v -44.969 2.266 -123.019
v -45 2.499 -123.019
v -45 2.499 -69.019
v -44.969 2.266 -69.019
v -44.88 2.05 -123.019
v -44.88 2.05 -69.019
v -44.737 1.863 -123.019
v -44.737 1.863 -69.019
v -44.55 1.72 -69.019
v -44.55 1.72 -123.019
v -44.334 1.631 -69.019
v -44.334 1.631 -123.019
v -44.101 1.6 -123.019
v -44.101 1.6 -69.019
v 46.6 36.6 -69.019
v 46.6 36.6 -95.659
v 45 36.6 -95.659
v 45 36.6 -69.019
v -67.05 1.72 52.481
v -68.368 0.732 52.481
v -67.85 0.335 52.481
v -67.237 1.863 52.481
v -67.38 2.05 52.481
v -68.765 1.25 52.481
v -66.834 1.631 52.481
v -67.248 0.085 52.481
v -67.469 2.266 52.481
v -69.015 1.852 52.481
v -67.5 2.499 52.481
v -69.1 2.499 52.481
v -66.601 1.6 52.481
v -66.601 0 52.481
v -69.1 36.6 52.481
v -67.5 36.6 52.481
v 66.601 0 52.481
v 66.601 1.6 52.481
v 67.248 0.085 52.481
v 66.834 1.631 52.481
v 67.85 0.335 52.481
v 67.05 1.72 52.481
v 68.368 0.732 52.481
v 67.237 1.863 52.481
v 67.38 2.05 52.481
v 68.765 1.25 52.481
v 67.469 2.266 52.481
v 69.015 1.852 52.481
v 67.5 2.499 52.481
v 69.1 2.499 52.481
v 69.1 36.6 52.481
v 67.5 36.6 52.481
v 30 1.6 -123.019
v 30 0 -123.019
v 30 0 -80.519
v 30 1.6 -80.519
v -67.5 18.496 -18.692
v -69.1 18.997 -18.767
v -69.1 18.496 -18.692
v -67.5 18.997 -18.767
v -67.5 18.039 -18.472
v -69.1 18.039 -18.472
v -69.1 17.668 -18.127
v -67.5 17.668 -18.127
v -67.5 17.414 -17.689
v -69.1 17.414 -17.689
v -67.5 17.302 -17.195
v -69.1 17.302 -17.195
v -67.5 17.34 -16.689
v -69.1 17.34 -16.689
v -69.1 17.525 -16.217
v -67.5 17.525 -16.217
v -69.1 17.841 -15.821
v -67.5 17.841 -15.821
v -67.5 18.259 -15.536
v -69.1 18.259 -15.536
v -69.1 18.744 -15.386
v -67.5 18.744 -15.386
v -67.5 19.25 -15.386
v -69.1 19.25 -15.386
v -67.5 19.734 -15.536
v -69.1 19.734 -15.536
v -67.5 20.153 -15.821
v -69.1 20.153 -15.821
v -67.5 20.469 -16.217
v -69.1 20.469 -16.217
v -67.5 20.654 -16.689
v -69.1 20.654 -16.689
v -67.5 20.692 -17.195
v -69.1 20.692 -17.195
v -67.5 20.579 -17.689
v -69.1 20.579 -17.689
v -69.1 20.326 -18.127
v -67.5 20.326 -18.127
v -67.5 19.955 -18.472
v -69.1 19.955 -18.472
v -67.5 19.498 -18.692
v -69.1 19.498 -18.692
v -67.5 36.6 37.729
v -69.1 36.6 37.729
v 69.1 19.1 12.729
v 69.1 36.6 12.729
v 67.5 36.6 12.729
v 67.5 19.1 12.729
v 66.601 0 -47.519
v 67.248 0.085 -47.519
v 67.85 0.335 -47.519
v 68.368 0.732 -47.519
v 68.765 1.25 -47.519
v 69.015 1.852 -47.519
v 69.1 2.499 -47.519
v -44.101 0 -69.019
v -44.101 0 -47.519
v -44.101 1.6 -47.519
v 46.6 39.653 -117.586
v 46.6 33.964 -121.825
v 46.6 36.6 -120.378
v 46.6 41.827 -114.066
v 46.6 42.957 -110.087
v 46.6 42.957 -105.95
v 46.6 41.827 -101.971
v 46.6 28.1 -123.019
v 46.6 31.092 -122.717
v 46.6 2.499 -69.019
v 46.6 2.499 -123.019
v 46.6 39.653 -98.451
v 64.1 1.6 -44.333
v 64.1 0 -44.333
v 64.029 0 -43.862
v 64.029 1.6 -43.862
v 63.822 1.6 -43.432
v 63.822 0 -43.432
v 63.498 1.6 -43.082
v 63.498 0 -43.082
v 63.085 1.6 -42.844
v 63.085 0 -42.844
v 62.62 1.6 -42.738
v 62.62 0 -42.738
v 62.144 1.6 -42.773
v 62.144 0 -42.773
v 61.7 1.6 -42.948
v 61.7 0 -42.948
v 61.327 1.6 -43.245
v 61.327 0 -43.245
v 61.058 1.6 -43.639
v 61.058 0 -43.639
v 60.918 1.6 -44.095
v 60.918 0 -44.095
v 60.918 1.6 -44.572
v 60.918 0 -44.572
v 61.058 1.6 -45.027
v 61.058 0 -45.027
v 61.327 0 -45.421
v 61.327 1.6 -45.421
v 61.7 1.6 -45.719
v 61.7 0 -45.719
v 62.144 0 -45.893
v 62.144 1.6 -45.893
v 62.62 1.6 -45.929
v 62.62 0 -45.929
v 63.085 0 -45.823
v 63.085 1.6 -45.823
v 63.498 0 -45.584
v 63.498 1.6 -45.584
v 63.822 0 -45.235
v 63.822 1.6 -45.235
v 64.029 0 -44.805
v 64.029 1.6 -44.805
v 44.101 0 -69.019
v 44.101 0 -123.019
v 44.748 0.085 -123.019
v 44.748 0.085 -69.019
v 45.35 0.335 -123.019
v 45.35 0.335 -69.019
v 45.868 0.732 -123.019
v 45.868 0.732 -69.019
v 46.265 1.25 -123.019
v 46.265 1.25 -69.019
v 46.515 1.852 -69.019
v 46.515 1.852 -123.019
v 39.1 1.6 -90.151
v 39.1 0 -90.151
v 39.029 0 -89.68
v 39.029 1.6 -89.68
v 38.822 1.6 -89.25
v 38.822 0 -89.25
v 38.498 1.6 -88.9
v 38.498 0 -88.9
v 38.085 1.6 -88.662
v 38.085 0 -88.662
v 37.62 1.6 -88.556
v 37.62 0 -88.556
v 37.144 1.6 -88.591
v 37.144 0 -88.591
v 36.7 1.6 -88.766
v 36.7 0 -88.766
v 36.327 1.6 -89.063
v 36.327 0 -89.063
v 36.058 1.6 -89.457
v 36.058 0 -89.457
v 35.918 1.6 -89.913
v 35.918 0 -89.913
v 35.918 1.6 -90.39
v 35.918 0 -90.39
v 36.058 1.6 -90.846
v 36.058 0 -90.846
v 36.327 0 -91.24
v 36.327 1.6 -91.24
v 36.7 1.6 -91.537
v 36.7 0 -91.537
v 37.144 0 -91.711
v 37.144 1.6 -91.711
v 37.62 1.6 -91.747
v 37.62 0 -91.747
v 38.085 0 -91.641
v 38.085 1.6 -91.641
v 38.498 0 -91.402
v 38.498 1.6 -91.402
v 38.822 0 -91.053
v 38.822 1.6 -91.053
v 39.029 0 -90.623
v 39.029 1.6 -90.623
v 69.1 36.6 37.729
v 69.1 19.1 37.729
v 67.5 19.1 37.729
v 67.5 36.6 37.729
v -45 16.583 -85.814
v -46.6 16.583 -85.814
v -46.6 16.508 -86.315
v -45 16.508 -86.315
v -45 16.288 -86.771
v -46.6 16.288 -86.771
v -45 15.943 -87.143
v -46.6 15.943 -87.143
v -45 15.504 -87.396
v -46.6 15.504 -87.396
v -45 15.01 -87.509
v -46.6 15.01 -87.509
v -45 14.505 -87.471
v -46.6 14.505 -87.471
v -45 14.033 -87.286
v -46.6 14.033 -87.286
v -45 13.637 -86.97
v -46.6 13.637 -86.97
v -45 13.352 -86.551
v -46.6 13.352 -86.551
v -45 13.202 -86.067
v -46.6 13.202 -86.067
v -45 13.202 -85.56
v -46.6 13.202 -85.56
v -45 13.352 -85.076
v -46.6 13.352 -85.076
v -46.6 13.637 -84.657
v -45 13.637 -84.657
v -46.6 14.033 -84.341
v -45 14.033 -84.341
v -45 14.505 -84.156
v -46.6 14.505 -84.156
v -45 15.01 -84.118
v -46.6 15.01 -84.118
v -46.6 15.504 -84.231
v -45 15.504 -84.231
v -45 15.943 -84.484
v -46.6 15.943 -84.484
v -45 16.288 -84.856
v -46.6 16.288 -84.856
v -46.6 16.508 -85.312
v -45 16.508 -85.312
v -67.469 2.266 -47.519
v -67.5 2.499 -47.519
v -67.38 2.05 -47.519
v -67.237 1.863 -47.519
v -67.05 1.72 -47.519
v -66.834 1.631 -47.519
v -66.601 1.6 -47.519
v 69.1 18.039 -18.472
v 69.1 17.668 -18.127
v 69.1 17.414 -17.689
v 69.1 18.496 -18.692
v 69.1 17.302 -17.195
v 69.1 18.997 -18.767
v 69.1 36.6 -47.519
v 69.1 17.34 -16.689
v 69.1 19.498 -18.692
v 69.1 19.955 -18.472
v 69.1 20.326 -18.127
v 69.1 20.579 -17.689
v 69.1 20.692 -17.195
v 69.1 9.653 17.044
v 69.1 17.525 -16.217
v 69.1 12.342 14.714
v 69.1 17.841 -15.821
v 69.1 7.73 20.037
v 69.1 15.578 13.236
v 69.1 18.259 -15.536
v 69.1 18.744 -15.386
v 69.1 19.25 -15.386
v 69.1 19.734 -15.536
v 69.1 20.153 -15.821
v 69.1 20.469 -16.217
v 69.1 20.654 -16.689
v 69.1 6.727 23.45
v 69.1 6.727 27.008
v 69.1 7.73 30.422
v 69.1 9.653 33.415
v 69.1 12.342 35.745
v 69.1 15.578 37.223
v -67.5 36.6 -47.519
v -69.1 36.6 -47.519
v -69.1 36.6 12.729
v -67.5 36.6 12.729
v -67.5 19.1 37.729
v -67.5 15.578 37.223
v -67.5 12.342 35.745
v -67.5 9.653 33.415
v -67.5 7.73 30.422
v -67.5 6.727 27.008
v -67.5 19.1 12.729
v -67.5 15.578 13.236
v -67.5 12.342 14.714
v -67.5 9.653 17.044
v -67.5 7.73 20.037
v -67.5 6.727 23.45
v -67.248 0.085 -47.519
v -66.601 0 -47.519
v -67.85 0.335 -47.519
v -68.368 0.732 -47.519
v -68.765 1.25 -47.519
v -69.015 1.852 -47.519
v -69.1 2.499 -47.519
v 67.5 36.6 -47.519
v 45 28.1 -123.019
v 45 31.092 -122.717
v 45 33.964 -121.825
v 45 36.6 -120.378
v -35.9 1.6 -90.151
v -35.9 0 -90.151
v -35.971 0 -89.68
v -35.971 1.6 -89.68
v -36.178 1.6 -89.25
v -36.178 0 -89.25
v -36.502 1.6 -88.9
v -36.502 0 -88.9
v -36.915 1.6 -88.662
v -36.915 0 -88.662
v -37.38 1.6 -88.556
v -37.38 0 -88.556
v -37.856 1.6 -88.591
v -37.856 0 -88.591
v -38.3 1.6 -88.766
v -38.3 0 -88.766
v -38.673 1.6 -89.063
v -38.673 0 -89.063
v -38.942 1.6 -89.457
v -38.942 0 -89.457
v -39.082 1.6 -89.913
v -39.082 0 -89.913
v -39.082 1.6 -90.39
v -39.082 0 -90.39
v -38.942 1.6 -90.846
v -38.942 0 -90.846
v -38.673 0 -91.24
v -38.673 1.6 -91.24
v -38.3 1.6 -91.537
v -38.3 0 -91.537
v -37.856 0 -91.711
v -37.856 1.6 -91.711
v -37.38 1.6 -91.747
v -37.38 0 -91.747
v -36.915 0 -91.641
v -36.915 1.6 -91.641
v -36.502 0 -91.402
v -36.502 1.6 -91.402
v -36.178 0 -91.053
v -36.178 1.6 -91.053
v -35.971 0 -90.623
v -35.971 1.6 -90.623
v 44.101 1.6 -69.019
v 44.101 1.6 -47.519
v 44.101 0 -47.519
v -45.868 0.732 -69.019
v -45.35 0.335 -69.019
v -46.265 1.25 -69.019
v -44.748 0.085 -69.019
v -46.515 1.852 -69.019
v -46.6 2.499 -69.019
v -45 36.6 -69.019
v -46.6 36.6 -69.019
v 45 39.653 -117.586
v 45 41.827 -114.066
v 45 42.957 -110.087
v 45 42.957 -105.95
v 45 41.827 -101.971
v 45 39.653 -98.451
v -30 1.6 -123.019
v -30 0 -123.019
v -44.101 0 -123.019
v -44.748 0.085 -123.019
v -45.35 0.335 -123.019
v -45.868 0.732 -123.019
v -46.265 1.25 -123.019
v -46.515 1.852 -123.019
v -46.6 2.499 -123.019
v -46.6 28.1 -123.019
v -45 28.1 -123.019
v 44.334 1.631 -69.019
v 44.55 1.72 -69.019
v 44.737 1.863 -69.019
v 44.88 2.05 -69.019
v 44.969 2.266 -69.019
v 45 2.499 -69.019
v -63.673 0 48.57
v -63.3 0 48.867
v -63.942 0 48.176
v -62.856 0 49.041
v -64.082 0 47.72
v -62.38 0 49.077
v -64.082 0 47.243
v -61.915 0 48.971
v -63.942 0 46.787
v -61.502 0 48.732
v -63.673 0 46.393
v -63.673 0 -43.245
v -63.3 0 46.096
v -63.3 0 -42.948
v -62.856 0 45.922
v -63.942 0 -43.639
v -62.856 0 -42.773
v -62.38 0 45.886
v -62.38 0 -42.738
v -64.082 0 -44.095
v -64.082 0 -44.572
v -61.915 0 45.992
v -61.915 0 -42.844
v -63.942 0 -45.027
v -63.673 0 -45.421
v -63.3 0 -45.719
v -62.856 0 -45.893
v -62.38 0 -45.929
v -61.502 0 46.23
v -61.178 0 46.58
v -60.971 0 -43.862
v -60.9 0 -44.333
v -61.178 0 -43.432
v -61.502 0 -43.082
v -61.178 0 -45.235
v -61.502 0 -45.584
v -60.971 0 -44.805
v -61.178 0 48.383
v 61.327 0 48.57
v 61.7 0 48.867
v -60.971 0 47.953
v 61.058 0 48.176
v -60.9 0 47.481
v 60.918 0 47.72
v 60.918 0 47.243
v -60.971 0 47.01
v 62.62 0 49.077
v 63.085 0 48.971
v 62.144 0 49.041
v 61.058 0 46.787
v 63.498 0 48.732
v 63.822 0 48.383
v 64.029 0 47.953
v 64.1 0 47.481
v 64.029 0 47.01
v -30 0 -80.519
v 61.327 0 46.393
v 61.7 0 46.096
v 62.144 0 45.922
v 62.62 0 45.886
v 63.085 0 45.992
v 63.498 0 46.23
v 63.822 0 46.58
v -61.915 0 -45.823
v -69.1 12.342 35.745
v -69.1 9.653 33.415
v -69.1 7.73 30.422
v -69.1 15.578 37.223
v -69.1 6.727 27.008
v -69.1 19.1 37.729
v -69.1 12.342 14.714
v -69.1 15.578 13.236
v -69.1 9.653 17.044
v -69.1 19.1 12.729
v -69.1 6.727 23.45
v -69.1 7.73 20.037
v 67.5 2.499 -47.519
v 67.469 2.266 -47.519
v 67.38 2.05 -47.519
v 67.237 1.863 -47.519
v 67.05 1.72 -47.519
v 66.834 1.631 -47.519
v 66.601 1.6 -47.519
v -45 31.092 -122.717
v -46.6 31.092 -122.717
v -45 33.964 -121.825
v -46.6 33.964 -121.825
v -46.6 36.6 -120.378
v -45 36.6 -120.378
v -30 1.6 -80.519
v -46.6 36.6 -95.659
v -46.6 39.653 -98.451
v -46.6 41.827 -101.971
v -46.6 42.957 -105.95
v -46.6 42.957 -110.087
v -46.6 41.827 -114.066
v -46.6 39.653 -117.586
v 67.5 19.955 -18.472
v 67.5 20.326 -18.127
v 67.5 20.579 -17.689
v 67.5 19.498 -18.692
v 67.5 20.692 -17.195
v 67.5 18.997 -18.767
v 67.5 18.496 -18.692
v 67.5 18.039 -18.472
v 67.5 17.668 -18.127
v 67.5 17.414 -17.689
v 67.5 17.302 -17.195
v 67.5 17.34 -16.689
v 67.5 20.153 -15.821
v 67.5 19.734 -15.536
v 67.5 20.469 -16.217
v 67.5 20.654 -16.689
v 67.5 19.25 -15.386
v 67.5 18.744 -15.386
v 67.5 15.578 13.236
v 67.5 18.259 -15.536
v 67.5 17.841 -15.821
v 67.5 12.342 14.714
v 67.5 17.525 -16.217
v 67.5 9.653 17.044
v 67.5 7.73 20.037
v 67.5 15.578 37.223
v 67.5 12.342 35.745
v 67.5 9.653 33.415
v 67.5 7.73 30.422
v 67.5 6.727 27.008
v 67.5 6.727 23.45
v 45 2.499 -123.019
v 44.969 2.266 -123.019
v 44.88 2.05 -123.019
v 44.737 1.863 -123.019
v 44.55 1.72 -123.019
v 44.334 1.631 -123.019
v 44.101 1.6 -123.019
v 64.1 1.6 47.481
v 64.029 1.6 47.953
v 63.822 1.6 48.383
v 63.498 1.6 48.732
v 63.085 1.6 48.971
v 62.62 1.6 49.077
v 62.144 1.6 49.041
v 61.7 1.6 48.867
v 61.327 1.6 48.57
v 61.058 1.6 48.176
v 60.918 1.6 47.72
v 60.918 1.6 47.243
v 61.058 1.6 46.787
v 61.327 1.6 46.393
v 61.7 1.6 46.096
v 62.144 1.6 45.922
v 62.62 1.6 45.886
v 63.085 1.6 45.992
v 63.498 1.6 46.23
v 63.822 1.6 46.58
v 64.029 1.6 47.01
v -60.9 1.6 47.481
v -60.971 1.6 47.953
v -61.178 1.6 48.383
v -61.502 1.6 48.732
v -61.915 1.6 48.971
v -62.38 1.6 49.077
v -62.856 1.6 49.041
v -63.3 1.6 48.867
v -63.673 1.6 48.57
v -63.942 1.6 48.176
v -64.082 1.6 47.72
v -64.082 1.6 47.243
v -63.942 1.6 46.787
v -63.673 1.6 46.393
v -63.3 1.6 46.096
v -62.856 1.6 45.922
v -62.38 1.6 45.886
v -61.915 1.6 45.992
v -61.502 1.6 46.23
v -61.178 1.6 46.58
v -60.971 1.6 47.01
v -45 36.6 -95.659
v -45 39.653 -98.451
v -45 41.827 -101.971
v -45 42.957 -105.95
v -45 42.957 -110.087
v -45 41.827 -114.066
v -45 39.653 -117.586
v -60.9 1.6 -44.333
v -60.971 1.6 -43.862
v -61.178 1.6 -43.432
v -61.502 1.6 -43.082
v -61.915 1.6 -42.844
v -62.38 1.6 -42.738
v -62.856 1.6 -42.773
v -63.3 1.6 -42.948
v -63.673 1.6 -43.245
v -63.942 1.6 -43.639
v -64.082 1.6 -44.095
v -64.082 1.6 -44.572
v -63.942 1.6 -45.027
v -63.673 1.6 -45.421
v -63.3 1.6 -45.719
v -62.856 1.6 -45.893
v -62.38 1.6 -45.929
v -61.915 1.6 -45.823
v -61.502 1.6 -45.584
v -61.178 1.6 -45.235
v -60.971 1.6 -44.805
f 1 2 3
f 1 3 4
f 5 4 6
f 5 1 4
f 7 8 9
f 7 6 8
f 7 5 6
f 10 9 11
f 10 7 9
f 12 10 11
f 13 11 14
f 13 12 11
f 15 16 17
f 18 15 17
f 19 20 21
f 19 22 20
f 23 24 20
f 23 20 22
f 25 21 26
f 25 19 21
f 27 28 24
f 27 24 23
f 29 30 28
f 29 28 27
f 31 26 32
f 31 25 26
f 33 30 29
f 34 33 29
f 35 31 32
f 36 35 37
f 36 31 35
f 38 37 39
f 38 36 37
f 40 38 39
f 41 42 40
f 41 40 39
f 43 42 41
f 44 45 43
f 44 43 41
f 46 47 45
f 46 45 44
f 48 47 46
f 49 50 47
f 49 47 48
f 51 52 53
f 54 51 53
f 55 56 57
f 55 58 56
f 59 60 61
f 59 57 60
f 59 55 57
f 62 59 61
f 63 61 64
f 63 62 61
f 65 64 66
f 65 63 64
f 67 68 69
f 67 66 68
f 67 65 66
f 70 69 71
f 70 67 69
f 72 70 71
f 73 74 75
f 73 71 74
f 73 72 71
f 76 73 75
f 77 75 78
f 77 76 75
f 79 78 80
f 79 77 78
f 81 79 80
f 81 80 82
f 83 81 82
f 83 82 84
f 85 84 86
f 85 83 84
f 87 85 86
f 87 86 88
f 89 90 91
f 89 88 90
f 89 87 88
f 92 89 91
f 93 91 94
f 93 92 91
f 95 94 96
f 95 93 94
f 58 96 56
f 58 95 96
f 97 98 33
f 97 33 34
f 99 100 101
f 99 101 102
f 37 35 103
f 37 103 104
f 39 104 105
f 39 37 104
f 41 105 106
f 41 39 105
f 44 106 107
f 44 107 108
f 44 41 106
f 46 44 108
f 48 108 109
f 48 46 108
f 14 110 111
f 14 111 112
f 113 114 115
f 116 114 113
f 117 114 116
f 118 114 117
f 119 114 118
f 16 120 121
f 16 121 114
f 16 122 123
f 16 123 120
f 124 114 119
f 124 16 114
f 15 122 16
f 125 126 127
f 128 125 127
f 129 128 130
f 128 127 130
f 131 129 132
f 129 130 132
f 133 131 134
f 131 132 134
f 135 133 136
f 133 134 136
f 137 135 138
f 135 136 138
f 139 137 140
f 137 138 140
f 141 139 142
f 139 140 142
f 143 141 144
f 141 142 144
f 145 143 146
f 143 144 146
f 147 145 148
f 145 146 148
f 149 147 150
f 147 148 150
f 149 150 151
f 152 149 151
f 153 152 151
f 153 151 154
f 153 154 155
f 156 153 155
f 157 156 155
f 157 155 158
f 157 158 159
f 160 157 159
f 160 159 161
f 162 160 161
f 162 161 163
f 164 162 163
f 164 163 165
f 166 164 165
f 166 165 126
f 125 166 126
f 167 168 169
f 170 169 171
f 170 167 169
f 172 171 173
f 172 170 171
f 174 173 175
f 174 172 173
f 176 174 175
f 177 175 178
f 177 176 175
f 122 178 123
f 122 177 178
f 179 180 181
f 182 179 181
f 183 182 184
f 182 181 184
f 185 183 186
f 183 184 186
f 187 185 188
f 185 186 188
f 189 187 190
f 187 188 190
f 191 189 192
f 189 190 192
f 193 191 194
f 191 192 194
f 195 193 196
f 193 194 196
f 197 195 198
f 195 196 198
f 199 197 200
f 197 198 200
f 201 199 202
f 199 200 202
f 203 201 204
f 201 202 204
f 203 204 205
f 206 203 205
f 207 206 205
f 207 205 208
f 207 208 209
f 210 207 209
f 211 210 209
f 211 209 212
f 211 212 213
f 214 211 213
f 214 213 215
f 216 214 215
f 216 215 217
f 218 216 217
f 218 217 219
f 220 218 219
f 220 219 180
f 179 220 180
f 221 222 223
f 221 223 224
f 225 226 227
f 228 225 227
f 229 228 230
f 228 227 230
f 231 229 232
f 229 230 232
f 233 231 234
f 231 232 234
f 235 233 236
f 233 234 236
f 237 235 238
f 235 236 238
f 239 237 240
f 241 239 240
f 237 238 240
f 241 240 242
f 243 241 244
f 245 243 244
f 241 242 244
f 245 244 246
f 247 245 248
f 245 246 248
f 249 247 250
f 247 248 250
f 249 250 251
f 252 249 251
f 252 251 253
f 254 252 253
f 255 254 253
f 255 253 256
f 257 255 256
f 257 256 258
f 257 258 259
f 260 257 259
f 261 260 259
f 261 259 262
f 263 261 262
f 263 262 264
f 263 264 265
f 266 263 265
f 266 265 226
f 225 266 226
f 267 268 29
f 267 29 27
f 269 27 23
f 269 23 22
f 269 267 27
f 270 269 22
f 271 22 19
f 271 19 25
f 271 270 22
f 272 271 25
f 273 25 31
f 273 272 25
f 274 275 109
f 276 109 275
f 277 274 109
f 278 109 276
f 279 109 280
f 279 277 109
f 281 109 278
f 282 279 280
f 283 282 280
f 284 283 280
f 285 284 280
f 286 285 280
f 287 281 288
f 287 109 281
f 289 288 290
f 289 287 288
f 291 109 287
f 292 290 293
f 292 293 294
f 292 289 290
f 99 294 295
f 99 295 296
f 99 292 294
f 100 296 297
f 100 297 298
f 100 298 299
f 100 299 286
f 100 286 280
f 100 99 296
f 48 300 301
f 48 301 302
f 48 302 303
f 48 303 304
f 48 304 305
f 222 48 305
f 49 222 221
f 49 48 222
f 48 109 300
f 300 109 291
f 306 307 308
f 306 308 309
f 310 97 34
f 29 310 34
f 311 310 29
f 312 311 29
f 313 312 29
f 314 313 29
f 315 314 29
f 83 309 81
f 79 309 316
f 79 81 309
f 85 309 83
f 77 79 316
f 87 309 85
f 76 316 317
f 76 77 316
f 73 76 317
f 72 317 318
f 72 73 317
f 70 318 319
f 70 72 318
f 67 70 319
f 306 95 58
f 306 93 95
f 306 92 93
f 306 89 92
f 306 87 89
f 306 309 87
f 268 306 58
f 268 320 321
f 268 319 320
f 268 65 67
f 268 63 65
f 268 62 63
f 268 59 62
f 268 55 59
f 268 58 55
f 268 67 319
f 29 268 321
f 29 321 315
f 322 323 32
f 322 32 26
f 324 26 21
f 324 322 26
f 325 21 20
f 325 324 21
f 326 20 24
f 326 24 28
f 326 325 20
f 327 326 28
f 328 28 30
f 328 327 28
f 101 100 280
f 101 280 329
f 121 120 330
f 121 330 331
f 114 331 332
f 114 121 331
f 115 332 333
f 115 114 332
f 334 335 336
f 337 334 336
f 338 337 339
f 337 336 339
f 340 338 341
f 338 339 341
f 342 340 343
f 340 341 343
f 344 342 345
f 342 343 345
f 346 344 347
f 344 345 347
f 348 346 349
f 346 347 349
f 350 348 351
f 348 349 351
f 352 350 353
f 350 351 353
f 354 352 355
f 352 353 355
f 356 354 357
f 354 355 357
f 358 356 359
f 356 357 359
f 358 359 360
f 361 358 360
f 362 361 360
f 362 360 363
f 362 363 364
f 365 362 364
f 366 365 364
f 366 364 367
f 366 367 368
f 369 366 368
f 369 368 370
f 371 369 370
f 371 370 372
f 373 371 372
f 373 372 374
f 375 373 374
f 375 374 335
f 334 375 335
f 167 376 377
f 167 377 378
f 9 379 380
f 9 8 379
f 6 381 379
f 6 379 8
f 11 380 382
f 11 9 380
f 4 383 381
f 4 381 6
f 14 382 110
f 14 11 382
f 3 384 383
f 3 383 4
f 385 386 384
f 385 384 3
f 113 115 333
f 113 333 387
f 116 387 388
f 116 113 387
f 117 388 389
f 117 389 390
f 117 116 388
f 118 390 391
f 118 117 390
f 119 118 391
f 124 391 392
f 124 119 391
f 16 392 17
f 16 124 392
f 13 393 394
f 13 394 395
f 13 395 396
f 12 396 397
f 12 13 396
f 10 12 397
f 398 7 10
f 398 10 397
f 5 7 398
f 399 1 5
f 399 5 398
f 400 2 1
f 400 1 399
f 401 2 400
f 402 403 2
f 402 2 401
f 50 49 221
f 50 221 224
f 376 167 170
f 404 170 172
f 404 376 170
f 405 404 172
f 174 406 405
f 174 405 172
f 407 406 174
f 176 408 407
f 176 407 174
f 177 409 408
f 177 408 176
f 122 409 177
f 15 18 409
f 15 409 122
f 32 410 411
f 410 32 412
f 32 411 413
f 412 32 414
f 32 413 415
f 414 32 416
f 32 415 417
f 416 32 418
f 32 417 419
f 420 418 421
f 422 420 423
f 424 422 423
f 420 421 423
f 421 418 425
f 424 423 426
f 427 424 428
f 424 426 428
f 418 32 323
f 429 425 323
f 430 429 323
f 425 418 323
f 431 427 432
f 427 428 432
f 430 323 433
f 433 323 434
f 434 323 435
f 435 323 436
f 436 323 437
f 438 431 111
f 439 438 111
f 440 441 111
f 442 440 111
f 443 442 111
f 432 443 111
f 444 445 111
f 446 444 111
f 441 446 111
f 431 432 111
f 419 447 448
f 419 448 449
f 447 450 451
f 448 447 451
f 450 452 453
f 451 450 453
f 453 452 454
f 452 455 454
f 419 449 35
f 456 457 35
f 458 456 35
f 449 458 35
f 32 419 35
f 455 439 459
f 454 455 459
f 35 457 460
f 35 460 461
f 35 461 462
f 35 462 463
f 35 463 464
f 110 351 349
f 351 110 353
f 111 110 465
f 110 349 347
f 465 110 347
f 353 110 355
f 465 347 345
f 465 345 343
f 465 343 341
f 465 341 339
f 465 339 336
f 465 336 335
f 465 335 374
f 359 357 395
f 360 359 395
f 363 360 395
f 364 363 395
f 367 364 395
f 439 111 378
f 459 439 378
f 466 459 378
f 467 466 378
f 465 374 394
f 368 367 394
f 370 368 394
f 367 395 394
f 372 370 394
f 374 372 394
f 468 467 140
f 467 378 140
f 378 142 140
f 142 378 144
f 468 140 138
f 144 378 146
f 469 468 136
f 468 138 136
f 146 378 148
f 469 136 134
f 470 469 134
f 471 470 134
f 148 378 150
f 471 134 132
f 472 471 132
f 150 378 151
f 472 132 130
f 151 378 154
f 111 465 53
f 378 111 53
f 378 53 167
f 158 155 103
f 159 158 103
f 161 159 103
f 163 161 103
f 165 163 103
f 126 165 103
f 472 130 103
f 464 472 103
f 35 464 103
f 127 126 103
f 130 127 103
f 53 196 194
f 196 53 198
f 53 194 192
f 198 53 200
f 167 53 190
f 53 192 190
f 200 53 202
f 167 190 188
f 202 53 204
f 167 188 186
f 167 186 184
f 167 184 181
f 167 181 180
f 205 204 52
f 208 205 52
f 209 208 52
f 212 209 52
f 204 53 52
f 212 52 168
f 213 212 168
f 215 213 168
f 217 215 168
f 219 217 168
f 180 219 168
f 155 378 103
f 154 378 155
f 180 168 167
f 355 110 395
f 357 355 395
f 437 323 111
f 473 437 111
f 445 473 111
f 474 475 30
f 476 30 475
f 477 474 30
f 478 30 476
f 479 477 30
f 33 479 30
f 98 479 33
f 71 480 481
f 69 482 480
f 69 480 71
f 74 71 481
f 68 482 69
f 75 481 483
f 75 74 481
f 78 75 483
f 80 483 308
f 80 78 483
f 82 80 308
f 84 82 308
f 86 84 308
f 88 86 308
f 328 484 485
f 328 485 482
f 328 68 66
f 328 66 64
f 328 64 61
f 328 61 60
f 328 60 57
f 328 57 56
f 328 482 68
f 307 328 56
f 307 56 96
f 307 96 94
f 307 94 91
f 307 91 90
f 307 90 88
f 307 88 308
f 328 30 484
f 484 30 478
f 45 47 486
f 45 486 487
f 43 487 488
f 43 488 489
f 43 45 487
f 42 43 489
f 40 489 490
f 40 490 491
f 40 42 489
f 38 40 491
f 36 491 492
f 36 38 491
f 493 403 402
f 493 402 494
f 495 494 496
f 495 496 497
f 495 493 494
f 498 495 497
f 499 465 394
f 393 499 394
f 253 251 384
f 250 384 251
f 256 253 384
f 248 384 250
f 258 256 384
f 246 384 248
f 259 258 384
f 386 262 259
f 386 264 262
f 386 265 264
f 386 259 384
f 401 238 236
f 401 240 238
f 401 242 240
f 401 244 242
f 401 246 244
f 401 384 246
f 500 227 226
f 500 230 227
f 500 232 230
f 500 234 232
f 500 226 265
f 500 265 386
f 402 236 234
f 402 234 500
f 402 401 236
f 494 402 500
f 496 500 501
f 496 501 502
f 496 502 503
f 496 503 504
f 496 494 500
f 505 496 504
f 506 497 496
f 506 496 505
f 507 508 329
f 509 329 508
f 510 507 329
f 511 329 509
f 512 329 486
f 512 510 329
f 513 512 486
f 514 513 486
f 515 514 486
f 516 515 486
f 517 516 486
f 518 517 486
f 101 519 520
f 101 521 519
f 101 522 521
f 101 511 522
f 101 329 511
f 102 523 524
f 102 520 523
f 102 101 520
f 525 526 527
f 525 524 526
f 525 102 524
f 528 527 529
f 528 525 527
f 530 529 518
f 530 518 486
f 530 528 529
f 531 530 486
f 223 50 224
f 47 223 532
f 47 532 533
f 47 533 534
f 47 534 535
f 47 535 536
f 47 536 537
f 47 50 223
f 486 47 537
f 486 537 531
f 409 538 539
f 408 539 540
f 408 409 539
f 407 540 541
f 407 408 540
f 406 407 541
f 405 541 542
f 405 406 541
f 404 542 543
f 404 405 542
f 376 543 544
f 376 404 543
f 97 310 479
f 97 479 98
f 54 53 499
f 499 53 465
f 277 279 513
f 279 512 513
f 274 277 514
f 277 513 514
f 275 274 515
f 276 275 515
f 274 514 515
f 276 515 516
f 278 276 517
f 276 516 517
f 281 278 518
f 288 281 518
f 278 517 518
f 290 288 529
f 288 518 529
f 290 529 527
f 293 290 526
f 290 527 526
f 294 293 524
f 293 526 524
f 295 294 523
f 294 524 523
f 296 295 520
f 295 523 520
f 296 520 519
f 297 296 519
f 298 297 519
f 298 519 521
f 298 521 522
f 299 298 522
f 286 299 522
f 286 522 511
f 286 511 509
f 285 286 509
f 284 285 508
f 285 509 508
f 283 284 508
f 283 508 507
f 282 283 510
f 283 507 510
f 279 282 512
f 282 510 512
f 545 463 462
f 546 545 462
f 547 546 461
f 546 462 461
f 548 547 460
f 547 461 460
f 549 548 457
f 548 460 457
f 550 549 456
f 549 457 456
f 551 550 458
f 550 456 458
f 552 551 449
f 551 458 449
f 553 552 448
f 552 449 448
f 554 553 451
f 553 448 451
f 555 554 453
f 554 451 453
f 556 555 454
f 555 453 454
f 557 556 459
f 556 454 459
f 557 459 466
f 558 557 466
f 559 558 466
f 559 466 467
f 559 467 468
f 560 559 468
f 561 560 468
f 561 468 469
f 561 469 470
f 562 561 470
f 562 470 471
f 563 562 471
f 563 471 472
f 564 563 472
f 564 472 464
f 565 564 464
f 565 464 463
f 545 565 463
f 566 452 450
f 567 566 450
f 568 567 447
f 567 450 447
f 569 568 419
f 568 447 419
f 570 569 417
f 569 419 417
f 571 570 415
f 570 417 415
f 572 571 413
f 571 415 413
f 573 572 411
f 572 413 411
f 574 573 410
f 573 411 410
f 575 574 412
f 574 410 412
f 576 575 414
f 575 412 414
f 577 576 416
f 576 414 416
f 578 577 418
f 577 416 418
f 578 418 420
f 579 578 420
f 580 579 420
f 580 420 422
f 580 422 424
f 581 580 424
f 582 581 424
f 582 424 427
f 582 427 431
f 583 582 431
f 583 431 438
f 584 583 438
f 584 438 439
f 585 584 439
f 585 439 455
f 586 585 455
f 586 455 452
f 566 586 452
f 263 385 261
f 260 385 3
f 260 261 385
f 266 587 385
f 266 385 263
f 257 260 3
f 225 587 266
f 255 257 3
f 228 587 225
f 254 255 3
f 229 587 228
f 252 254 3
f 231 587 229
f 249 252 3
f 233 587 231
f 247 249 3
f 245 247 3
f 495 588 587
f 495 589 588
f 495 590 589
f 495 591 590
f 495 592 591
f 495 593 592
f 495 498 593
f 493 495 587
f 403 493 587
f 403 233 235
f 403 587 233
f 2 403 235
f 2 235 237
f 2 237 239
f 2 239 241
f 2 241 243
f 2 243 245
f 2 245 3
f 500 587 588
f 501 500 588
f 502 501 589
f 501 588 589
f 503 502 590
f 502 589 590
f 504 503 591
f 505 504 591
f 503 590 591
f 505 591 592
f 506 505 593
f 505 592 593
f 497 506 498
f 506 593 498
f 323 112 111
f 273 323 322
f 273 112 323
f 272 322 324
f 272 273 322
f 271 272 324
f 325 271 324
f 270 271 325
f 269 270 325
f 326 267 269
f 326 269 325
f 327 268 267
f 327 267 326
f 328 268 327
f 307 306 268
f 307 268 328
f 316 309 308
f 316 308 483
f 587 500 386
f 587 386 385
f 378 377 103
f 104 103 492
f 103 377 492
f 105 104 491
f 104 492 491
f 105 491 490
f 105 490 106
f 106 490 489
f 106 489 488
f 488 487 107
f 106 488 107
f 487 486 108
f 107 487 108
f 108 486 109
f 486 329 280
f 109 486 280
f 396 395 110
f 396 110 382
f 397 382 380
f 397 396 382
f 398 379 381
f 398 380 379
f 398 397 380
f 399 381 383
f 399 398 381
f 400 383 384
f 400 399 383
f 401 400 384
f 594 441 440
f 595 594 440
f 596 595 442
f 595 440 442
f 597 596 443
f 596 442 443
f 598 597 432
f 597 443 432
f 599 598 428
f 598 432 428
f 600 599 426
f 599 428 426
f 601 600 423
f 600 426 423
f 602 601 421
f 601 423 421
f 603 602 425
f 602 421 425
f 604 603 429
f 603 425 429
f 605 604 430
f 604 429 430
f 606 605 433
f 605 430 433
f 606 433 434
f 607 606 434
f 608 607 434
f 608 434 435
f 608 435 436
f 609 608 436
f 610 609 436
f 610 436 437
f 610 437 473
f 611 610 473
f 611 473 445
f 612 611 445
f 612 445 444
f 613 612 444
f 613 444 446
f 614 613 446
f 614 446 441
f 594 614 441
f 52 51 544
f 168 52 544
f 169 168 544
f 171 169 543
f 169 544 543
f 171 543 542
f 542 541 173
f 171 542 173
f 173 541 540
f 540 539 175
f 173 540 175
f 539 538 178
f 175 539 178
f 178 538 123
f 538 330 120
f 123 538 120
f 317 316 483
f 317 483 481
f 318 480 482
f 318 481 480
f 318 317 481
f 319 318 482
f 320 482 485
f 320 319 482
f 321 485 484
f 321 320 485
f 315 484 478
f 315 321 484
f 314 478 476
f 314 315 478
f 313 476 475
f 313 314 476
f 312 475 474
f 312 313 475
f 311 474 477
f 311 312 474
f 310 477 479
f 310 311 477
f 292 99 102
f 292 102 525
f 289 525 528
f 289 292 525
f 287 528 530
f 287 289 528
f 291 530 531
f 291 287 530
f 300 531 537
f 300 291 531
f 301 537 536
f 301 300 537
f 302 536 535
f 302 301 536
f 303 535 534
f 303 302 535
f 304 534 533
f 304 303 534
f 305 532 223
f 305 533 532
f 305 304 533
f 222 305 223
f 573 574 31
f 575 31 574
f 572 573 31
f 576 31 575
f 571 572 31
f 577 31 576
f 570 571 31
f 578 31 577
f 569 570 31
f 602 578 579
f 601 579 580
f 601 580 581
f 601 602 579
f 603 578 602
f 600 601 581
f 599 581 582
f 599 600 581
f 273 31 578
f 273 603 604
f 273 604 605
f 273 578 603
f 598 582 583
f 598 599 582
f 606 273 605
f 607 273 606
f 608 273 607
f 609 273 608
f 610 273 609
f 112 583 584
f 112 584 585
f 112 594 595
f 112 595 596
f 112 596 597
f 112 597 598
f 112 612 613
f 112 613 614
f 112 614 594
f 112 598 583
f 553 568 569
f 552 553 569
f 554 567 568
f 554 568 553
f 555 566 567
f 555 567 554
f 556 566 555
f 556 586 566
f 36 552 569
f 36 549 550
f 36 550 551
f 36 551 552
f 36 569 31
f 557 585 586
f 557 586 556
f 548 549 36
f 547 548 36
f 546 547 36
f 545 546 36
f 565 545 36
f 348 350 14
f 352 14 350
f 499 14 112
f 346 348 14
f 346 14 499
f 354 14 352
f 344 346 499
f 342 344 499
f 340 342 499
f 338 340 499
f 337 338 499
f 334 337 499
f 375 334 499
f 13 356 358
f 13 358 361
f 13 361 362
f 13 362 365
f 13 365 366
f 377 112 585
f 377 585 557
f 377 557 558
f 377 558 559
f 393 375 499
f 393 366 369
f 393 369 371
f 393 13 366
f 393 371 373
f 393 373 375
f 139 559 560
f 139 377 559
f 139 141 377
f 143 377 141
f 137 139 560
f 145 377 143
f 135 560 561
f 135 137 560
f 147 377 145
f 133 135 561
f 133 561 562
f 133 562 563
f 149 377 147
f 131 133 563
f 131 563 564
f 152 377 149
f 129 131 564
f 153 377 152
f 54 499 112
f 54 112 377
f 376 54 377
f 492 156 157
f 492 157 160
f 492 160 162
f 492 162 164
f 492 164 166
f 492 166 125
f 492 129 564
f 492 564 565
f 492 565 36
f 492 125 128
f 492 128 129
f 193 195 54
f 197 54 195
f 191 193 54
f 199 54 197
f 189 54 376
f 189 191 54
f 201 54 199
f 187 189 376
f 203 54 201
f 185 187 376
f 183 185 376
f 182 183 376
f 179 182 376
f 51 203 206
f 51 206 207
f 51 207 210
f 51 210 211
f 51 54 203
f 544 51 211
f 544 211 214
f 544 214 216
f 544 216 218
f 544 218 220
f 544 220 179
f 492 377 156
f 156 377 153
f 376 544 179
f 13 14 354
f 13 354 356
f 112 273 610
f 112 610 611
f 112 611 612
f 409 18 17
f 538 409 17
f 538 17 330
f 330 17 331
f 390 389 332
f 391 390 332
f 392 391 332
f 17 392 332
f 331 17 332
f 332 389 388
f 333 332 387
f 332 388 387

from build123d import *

# Parameters (mm, degrees)
BOSS_EXTRUDE2_DEPTH            = 1.6
EDGE_FLANGE1_STRIP_W           = 8.198
EDGE_FLANGE1_STRIP_H           = 1.6
EDGE_FLANGE1_STRIP_CUT_DEPTH   = 100
EDGE_FLANGE1_STRIP_2_W         = 8.198
EDGE_FLANGE1_STRIP_2_H         = 1.6
EDGE_FLANGE1_STRIP_CUT_2_DEPTH = 75.5
EDGE_FLANGE1_STRIP_3_W         = 8.198
EDGE_FLANGE1_STRIP_3_H         = 1.6
EDGE_FLANGE1_STRIP_CUT_3_DEPTH = 75.5
EDGE_FLANGE1_STRIP_4_W         = 8.198
EDGE_FLANGE1_STRIP_4_H         = 1.6
EDGE_FLANGE1_STRIP_CUT_4_DEPTH = 100
EDGE_FLANGE1_DEPTH             = 100
EDGE_FLANGE1_BEND_DEPTH        = 75.5
EDGE_FLANGE1_BEND_2_DEPTH      = 75.5
EDGE_FLANGE1_BEND_3_DEPTH      = 100
CUT_EXTRUDE1_START             = -69.018571159
CUT_EXTRUDE1_DEPTH             = 21.5
SKETCH24_R                     = 15
BOSS_EXTRUDE3_DEPTH            = 1.6
BOSS_EXTRUDE4_START            = -1.6
SKETCH25_R                     = 15
BOSS_EXTRUDE4_DEPTH            = 1.6
CUT_EXTRUDE2_DEPTH             = 109.6
CUT_EXTRUDE3_DEPTH             = 1000
M3_CLEARANCE_HOLE1_D           = 3.2
HOLE1_D                        = 3.4
HOLE1_DEPTH                    = 67.5
HOLE1_CBORE_D                  = 6
HOLE1_CBORE_DEPTH              = 16
CUT_EXTRUDE4_REACH             = 180.195
SKETCH36_R                     = 1.7


# Read off the part's stored shape, not the designer's step: Cut-Extrude1
# Sheet-metal steps are written as plain solids
with BuildPart() as part:
    # Sketch1 → Boss-Extrude2 (new body)
    with BuildSketch(Plane(origin=(0, 0, 0), x_dir=(1, 0, 0), z_dir=(0, 1, 0))):
        Polygon((45, 47.518571159), (45, 123.018571159), (30, 123.018571159), (30, 80.518571159), (-30, 80.518571159), (-30, 123.018571159), (-45, 123.018571159), (-45, 47.518571159), (-67.5, 47.518571159), (-67.5, -52.481428841), (67.5, -52.481428841), (67.5, 47.518571159), align=None)
    extrude(amount=BOSS_EXTRUDE2_DEPTH)

    # Edge-Flange1 strip (across the edge) → Edge-Flange1 strip cut (cut)
    with BuildSketch(Plane(origin=(-67.5, 1.6, -47.518571159), x_dir=(1, 0, 0), z_dir=(0, 0, 1))):
        with Locations((-3.2, -0.8)):
            Rectangle(EDGE_FLANGE1_STRIP_W, EDGE_FLANGE1_STRIP_H)
    extrude(amount=EDGE_FLANGE1_STRIP_CUT_DEPTH, mode=Mode.SUBTRACT)

    # Edge-Flange1 strip 2 (across the edge) → Edge-Flange1 strip cut 2 (cut)
    with BuildSketch(Plane(origin=(-45, 1.6, -123.018571159), x_dir=(1, 0, 0), z_dir=(0, 0, 1))):
        with Locations((-3.2, -0.8)):
            Rectangle(EDGE_FLANGE1_STRIP_2_W, EDGE_FLANGE1_STRIP_2_H)
    extrude(amount=EDGE_FLANGE1_STRIP_CUT_2_DEPTH, mode=Mode.SUBTRACT)

    # Edge-Flange1 strip 3 (across the edge) → Edge-Flange1 strip cut 3 (cut)
    with BuildSketch(Plane(origin=(45, 1.6, -47.518571159), x_dir=(-1, 0, 0), z_dir=(0, 0, -1))):
        with Locations((-3.2, -0.8)):
            Rectangle(EDGE_FLANGE1_STRIP_3_W, EDGE_FLANGE1_STRIP_3_H)
    extrude(amount=EDGE_FLANGE1_STRIP_CUT_3_DEPTH, mode=Mode.SUBTRACT)

    # Edge-Flange1 strip 4 (across the edge) → Edge-Flange1 strip cut 4 (cut)
    with BuildSketch(Plane(origin=(67.5, 1.6, 52.481428841), x_dir=(-1, 0, 0), z_dir=(0, 0, -1))):
        with Locations((-3.2, -0.8)):
            Rectangle(EDGE_FLANGE1_STRIP_4_W, EDGE_FLANGE1_STRIP_4_H)
    extrude(amount=EDGE_FLANGE1_STRIP_CUT_4_DEPTH, mode=Mode.SUBTRACT)

    # Edge-Flange1 section (across the edge) → Edge-Flange1 (add)
    with BuildSketch(Plane(origin=(-67.5, 1.6, -47.518571159), x_dir=(1, 0, 0), z_dir=(0, 0, 1))):
        with BuildLine():
            Line((-1.6, 0.899), (-1.6, 35))
            Line((-1.6, 35), (0, 35))
            Line((0, 35), (0, 0.899))
            ThreePointArc((0, 0.899), (0.263311004, 0.263311004), (0.899, 0))
            Line((0.899, 0), (0.899, -1.6))
            ThreePointArc((0.899, -1.6), (-0.868059846, -0.868059846), (-1.6, 0.899))
        make_face()
    extrude(amount=EDGE_FLANGE1_DEPTH)

    # Edge-Flange1 section 2 (across the edge) → Edge-Flange1 bend (add)
    with BuildSketch(Plane(origin=(-45, 1.6, -123.018571159), x_dir=(1, 0, 0), z_dir=(0, 0, 1))):
        with BuildLine():
            Line((-1.6, 0.899), (-1.6, 35))
            Line((-1.6, 35), (0, 35))
            Line((0, 35), (0, 0.899))
            ThreePointArc((0, 0.899), (0.263311004, 0.263311004), (0.899, 0))
            Line((0.899, 0), (0.899, -1.6))
            ThreePointArc((0.899, -1.6), (-0.868059846, -0.868059846), (-1.6, 0.899))
        make_face()
    extrude(amount=EDGE_FLANGE1_BEND_DEPTH)

    # Edge-Flange1 section 3 (across the edge) → Edge-Flange1 bend 2 (add)
    with BuildSketch(Plane(origin=(45, 1.6, -47.518571159), x_dir=(-1, 0, 0), z_dir=(0, 0, -1))):
        with BuildLine():
            Line((-1.6, 0.899), (-1.6, 35))
            Line((-1.6, 35), (0, 35))
            Line((0, 35), (0, 0.899))
            ThreePointArc((0, 0.899), (0.263311004, 0.263311004), (0.899, 0))
            Line((0.899, 0), (0.899, -1.6))
            ThreePointArc((0.899, -1.6), (-0.868059846, -0.868059846), (-1.6, 0.899))
        make_face()
    extrude(amount=EDGE_FLANGE1_BEND_2_DEPTH)

    # Edge-Flange1 section 4 (across the edge) → Edge-Flange1 bend 3 (add)
    with BuildSketch(Plane(origin=(67.5, 1.6, 52.481428841), x_dir=(-1, 0, 0), z_dir=(0, 0, -1))):
        with BuildLine():
            Line((-1.6, 0.899), (-1.6, 35))
            Line((-1.6, 35), (0, 35))
            Line((0, 35), (0, 0.899))
            ThreePointArc((0, 0.899), (0.263311004, 0.263311004), (0.899, 0))
            Line((0.899, 0), (0.899, -1.6))
            ThreePointArc((0.899, -1.6), (-0.868059846, -0.868059846), (-1.6, 0.899))
        make_face()
    extrude(amount=EDGE_FLANGE1_BEND_3_DEPTH)

    # Cut-Extrude1 outline → Cut-Extrude1 (cut)
    with BuildSketch(Plane.XY.offset(CUT_EXTRUDE1_START)):
        with BuildLine():
            ThreePointArc((45, 2.499), (44.736688996, 1.863311004), (44.101, 1.6))
            Line((44.101, 1.6), (44.101, 0))
            ThreePointArc((44.101, 0), (45.868059846, 0.731940154), (46.6, 2.499))
            Line((46.6, 2.499), (46.6, 36.6))
            Line((46.6, 36.6), (45, 36.6))
            Line((45, 36.6), (45, 2.499))
        make_face()
        with BuildLine():
            ThreePointArc((-46.6, 2.499), (-45.868059846, 0.731940154), (-44.101, 0))
            Line((-44.101, 0), (-44.101, 1.6))
            ThreePointArc((-44.101, 1.6), (-44.736688996, 1.863311004), (-45, 2.499))
            Line((-45, 2.499), (-45, 36.6))
            Line((-45, 36.6), (-46.6, 36.6))
            Line((-46.6, 36.6), (-46.6, 2.499))
        make_face()
    extrude(amount=CUT_EXTRUDE1_DEPTH, mode=Mode.SUBTRACT)

    # Sketch24 → Boss-Extrude3 (add)
    with BuildSketch(Plane(origin=(46.6, 0, 0), x_dir=(0, 0, -1), z_dir=(1, 0, 0))):
        with Locations((108.018571159, 28.1)):
            Circle(SKETCH24_R)
    extrude(amount=-BOSS_EXTRUDE3_DEPTH)

    # Sketch25 → Boss-Extrude4 (add)
    with BuildSketch(Plane.ZY.offset(46.6).offset(BOSS_EXTRUDE4_START)):
        with Locations((-108.018571159, 28.1)):
            Circle(SKETCH25_R)
    extrude(amount=BOSS_EXTRUDE4_DEPTH)

    # Sketch26 → Cut-Extrude2 (cut)
    with BuildSketch(Plane(origin=(46.6, 0, 0), x_dir=(0, 0, -1), z_dir=(1, 0, 0))):
        with BuildLine():
            Line((120.377778253, 36.6), (123.018571159, 36.6))
            Line((123.018571159, 36.6), (123.018571159, 28.1))
            ThreePointArc((123.018571159, 28.1), (122.343167251, 32.550387263), (120.377778253, 36.6))
        make_face()
    extrude(amount=-CUT_EXTRUDE2_DEPTH, mode=Mode.SUBTRACT)

    # Sketch27 → Cut-Extrude3 (cut)
    with BuildSketch(Plane(origin=(69.1, 0, 0), x_dir=(0, 0, -1), z_dir=(1, 0, 0))):
        with BuildLine():
            Line((-37.729365474, 19.100000095), (-37.729365474, 36.6))
            Line((-37.729365474, 36.6), (-12.729365474, 36.6))
            Line((-12.729365474, 36.6), (-12.729365474, 19.100000095))
            ThreePointArc((-12.729365474, 19.100000095), (-25.229365474, 6.600000095), (-37.729365474, 19.100000095))
        make_face()
    extrude(amount=-CUT_EXTRUDE3_DEPTH, mode=Mode.SUBTRACT)

    # M3 Clearance Hole1 (through all)
    with Locations(Plane(origin=(0, 1.6, -32.518571159), x_dir=(-1, 0, 0), z_dir=(0, 1, 0))):
        with Locations((-62.5, -11.814648696), (62.5, -11.814648696), (62.5, 80), (-62.5, 80), (-37.5, -57.632792906), (37.5, -57.632792906)):
            Hole(M3_CLEARANCE_HOLE1_D / 2)

    # Hole1
    with Locations(Plane(origin=(120, 6.6, -32.518571159), x_dir=(0, 0, 1), z_dir=(1, 0, 0))):
        with Locations((15.451100734, -12.39688985)):
            hole1 = CounterBoreHole(HOLE1_D / 2, HOLE1_CBORE_D / 2, HOLE1_CBORE_DEPTH, depth=HOLE1_DEPTH)

    # Mirror1: Hole1 across Right Plane
    add(hole1.mirror(Plane(origin=(0, 0, 0), x_dir=(0, 0, -1), z_dir=(1, 0, 0))), mode=Mode.SUBTRACT)

    # Sketch36 → Cut-Extrude4 (cut, up to next)
    with BuildSketch(Plane(origin=(-80, 6.6, -32.518571159), x_dir=(0, 0, 1), z_dir=(-1, 0, 0)), mode=Mode.PRIVATE) as cut_extrude4_sk1:
        with Locations(Location((-53.294944095, 8.283400622, 0), (0, 0, 90))):
            Circle(SKETCH36_R)
    cut_extrude4_tool1 = extrude(cut_extrude4_sk1.sketch, amount=-CUT_EXTRUDE4_REACH, mode=Mode.PRIVATE) & part.part
    add(cut_extrude4_tool1.solids().sort_by_distance((-80, 14.883401, -85.813515))[0], mode=Mode.SUBTRACT)


solid = part.part
